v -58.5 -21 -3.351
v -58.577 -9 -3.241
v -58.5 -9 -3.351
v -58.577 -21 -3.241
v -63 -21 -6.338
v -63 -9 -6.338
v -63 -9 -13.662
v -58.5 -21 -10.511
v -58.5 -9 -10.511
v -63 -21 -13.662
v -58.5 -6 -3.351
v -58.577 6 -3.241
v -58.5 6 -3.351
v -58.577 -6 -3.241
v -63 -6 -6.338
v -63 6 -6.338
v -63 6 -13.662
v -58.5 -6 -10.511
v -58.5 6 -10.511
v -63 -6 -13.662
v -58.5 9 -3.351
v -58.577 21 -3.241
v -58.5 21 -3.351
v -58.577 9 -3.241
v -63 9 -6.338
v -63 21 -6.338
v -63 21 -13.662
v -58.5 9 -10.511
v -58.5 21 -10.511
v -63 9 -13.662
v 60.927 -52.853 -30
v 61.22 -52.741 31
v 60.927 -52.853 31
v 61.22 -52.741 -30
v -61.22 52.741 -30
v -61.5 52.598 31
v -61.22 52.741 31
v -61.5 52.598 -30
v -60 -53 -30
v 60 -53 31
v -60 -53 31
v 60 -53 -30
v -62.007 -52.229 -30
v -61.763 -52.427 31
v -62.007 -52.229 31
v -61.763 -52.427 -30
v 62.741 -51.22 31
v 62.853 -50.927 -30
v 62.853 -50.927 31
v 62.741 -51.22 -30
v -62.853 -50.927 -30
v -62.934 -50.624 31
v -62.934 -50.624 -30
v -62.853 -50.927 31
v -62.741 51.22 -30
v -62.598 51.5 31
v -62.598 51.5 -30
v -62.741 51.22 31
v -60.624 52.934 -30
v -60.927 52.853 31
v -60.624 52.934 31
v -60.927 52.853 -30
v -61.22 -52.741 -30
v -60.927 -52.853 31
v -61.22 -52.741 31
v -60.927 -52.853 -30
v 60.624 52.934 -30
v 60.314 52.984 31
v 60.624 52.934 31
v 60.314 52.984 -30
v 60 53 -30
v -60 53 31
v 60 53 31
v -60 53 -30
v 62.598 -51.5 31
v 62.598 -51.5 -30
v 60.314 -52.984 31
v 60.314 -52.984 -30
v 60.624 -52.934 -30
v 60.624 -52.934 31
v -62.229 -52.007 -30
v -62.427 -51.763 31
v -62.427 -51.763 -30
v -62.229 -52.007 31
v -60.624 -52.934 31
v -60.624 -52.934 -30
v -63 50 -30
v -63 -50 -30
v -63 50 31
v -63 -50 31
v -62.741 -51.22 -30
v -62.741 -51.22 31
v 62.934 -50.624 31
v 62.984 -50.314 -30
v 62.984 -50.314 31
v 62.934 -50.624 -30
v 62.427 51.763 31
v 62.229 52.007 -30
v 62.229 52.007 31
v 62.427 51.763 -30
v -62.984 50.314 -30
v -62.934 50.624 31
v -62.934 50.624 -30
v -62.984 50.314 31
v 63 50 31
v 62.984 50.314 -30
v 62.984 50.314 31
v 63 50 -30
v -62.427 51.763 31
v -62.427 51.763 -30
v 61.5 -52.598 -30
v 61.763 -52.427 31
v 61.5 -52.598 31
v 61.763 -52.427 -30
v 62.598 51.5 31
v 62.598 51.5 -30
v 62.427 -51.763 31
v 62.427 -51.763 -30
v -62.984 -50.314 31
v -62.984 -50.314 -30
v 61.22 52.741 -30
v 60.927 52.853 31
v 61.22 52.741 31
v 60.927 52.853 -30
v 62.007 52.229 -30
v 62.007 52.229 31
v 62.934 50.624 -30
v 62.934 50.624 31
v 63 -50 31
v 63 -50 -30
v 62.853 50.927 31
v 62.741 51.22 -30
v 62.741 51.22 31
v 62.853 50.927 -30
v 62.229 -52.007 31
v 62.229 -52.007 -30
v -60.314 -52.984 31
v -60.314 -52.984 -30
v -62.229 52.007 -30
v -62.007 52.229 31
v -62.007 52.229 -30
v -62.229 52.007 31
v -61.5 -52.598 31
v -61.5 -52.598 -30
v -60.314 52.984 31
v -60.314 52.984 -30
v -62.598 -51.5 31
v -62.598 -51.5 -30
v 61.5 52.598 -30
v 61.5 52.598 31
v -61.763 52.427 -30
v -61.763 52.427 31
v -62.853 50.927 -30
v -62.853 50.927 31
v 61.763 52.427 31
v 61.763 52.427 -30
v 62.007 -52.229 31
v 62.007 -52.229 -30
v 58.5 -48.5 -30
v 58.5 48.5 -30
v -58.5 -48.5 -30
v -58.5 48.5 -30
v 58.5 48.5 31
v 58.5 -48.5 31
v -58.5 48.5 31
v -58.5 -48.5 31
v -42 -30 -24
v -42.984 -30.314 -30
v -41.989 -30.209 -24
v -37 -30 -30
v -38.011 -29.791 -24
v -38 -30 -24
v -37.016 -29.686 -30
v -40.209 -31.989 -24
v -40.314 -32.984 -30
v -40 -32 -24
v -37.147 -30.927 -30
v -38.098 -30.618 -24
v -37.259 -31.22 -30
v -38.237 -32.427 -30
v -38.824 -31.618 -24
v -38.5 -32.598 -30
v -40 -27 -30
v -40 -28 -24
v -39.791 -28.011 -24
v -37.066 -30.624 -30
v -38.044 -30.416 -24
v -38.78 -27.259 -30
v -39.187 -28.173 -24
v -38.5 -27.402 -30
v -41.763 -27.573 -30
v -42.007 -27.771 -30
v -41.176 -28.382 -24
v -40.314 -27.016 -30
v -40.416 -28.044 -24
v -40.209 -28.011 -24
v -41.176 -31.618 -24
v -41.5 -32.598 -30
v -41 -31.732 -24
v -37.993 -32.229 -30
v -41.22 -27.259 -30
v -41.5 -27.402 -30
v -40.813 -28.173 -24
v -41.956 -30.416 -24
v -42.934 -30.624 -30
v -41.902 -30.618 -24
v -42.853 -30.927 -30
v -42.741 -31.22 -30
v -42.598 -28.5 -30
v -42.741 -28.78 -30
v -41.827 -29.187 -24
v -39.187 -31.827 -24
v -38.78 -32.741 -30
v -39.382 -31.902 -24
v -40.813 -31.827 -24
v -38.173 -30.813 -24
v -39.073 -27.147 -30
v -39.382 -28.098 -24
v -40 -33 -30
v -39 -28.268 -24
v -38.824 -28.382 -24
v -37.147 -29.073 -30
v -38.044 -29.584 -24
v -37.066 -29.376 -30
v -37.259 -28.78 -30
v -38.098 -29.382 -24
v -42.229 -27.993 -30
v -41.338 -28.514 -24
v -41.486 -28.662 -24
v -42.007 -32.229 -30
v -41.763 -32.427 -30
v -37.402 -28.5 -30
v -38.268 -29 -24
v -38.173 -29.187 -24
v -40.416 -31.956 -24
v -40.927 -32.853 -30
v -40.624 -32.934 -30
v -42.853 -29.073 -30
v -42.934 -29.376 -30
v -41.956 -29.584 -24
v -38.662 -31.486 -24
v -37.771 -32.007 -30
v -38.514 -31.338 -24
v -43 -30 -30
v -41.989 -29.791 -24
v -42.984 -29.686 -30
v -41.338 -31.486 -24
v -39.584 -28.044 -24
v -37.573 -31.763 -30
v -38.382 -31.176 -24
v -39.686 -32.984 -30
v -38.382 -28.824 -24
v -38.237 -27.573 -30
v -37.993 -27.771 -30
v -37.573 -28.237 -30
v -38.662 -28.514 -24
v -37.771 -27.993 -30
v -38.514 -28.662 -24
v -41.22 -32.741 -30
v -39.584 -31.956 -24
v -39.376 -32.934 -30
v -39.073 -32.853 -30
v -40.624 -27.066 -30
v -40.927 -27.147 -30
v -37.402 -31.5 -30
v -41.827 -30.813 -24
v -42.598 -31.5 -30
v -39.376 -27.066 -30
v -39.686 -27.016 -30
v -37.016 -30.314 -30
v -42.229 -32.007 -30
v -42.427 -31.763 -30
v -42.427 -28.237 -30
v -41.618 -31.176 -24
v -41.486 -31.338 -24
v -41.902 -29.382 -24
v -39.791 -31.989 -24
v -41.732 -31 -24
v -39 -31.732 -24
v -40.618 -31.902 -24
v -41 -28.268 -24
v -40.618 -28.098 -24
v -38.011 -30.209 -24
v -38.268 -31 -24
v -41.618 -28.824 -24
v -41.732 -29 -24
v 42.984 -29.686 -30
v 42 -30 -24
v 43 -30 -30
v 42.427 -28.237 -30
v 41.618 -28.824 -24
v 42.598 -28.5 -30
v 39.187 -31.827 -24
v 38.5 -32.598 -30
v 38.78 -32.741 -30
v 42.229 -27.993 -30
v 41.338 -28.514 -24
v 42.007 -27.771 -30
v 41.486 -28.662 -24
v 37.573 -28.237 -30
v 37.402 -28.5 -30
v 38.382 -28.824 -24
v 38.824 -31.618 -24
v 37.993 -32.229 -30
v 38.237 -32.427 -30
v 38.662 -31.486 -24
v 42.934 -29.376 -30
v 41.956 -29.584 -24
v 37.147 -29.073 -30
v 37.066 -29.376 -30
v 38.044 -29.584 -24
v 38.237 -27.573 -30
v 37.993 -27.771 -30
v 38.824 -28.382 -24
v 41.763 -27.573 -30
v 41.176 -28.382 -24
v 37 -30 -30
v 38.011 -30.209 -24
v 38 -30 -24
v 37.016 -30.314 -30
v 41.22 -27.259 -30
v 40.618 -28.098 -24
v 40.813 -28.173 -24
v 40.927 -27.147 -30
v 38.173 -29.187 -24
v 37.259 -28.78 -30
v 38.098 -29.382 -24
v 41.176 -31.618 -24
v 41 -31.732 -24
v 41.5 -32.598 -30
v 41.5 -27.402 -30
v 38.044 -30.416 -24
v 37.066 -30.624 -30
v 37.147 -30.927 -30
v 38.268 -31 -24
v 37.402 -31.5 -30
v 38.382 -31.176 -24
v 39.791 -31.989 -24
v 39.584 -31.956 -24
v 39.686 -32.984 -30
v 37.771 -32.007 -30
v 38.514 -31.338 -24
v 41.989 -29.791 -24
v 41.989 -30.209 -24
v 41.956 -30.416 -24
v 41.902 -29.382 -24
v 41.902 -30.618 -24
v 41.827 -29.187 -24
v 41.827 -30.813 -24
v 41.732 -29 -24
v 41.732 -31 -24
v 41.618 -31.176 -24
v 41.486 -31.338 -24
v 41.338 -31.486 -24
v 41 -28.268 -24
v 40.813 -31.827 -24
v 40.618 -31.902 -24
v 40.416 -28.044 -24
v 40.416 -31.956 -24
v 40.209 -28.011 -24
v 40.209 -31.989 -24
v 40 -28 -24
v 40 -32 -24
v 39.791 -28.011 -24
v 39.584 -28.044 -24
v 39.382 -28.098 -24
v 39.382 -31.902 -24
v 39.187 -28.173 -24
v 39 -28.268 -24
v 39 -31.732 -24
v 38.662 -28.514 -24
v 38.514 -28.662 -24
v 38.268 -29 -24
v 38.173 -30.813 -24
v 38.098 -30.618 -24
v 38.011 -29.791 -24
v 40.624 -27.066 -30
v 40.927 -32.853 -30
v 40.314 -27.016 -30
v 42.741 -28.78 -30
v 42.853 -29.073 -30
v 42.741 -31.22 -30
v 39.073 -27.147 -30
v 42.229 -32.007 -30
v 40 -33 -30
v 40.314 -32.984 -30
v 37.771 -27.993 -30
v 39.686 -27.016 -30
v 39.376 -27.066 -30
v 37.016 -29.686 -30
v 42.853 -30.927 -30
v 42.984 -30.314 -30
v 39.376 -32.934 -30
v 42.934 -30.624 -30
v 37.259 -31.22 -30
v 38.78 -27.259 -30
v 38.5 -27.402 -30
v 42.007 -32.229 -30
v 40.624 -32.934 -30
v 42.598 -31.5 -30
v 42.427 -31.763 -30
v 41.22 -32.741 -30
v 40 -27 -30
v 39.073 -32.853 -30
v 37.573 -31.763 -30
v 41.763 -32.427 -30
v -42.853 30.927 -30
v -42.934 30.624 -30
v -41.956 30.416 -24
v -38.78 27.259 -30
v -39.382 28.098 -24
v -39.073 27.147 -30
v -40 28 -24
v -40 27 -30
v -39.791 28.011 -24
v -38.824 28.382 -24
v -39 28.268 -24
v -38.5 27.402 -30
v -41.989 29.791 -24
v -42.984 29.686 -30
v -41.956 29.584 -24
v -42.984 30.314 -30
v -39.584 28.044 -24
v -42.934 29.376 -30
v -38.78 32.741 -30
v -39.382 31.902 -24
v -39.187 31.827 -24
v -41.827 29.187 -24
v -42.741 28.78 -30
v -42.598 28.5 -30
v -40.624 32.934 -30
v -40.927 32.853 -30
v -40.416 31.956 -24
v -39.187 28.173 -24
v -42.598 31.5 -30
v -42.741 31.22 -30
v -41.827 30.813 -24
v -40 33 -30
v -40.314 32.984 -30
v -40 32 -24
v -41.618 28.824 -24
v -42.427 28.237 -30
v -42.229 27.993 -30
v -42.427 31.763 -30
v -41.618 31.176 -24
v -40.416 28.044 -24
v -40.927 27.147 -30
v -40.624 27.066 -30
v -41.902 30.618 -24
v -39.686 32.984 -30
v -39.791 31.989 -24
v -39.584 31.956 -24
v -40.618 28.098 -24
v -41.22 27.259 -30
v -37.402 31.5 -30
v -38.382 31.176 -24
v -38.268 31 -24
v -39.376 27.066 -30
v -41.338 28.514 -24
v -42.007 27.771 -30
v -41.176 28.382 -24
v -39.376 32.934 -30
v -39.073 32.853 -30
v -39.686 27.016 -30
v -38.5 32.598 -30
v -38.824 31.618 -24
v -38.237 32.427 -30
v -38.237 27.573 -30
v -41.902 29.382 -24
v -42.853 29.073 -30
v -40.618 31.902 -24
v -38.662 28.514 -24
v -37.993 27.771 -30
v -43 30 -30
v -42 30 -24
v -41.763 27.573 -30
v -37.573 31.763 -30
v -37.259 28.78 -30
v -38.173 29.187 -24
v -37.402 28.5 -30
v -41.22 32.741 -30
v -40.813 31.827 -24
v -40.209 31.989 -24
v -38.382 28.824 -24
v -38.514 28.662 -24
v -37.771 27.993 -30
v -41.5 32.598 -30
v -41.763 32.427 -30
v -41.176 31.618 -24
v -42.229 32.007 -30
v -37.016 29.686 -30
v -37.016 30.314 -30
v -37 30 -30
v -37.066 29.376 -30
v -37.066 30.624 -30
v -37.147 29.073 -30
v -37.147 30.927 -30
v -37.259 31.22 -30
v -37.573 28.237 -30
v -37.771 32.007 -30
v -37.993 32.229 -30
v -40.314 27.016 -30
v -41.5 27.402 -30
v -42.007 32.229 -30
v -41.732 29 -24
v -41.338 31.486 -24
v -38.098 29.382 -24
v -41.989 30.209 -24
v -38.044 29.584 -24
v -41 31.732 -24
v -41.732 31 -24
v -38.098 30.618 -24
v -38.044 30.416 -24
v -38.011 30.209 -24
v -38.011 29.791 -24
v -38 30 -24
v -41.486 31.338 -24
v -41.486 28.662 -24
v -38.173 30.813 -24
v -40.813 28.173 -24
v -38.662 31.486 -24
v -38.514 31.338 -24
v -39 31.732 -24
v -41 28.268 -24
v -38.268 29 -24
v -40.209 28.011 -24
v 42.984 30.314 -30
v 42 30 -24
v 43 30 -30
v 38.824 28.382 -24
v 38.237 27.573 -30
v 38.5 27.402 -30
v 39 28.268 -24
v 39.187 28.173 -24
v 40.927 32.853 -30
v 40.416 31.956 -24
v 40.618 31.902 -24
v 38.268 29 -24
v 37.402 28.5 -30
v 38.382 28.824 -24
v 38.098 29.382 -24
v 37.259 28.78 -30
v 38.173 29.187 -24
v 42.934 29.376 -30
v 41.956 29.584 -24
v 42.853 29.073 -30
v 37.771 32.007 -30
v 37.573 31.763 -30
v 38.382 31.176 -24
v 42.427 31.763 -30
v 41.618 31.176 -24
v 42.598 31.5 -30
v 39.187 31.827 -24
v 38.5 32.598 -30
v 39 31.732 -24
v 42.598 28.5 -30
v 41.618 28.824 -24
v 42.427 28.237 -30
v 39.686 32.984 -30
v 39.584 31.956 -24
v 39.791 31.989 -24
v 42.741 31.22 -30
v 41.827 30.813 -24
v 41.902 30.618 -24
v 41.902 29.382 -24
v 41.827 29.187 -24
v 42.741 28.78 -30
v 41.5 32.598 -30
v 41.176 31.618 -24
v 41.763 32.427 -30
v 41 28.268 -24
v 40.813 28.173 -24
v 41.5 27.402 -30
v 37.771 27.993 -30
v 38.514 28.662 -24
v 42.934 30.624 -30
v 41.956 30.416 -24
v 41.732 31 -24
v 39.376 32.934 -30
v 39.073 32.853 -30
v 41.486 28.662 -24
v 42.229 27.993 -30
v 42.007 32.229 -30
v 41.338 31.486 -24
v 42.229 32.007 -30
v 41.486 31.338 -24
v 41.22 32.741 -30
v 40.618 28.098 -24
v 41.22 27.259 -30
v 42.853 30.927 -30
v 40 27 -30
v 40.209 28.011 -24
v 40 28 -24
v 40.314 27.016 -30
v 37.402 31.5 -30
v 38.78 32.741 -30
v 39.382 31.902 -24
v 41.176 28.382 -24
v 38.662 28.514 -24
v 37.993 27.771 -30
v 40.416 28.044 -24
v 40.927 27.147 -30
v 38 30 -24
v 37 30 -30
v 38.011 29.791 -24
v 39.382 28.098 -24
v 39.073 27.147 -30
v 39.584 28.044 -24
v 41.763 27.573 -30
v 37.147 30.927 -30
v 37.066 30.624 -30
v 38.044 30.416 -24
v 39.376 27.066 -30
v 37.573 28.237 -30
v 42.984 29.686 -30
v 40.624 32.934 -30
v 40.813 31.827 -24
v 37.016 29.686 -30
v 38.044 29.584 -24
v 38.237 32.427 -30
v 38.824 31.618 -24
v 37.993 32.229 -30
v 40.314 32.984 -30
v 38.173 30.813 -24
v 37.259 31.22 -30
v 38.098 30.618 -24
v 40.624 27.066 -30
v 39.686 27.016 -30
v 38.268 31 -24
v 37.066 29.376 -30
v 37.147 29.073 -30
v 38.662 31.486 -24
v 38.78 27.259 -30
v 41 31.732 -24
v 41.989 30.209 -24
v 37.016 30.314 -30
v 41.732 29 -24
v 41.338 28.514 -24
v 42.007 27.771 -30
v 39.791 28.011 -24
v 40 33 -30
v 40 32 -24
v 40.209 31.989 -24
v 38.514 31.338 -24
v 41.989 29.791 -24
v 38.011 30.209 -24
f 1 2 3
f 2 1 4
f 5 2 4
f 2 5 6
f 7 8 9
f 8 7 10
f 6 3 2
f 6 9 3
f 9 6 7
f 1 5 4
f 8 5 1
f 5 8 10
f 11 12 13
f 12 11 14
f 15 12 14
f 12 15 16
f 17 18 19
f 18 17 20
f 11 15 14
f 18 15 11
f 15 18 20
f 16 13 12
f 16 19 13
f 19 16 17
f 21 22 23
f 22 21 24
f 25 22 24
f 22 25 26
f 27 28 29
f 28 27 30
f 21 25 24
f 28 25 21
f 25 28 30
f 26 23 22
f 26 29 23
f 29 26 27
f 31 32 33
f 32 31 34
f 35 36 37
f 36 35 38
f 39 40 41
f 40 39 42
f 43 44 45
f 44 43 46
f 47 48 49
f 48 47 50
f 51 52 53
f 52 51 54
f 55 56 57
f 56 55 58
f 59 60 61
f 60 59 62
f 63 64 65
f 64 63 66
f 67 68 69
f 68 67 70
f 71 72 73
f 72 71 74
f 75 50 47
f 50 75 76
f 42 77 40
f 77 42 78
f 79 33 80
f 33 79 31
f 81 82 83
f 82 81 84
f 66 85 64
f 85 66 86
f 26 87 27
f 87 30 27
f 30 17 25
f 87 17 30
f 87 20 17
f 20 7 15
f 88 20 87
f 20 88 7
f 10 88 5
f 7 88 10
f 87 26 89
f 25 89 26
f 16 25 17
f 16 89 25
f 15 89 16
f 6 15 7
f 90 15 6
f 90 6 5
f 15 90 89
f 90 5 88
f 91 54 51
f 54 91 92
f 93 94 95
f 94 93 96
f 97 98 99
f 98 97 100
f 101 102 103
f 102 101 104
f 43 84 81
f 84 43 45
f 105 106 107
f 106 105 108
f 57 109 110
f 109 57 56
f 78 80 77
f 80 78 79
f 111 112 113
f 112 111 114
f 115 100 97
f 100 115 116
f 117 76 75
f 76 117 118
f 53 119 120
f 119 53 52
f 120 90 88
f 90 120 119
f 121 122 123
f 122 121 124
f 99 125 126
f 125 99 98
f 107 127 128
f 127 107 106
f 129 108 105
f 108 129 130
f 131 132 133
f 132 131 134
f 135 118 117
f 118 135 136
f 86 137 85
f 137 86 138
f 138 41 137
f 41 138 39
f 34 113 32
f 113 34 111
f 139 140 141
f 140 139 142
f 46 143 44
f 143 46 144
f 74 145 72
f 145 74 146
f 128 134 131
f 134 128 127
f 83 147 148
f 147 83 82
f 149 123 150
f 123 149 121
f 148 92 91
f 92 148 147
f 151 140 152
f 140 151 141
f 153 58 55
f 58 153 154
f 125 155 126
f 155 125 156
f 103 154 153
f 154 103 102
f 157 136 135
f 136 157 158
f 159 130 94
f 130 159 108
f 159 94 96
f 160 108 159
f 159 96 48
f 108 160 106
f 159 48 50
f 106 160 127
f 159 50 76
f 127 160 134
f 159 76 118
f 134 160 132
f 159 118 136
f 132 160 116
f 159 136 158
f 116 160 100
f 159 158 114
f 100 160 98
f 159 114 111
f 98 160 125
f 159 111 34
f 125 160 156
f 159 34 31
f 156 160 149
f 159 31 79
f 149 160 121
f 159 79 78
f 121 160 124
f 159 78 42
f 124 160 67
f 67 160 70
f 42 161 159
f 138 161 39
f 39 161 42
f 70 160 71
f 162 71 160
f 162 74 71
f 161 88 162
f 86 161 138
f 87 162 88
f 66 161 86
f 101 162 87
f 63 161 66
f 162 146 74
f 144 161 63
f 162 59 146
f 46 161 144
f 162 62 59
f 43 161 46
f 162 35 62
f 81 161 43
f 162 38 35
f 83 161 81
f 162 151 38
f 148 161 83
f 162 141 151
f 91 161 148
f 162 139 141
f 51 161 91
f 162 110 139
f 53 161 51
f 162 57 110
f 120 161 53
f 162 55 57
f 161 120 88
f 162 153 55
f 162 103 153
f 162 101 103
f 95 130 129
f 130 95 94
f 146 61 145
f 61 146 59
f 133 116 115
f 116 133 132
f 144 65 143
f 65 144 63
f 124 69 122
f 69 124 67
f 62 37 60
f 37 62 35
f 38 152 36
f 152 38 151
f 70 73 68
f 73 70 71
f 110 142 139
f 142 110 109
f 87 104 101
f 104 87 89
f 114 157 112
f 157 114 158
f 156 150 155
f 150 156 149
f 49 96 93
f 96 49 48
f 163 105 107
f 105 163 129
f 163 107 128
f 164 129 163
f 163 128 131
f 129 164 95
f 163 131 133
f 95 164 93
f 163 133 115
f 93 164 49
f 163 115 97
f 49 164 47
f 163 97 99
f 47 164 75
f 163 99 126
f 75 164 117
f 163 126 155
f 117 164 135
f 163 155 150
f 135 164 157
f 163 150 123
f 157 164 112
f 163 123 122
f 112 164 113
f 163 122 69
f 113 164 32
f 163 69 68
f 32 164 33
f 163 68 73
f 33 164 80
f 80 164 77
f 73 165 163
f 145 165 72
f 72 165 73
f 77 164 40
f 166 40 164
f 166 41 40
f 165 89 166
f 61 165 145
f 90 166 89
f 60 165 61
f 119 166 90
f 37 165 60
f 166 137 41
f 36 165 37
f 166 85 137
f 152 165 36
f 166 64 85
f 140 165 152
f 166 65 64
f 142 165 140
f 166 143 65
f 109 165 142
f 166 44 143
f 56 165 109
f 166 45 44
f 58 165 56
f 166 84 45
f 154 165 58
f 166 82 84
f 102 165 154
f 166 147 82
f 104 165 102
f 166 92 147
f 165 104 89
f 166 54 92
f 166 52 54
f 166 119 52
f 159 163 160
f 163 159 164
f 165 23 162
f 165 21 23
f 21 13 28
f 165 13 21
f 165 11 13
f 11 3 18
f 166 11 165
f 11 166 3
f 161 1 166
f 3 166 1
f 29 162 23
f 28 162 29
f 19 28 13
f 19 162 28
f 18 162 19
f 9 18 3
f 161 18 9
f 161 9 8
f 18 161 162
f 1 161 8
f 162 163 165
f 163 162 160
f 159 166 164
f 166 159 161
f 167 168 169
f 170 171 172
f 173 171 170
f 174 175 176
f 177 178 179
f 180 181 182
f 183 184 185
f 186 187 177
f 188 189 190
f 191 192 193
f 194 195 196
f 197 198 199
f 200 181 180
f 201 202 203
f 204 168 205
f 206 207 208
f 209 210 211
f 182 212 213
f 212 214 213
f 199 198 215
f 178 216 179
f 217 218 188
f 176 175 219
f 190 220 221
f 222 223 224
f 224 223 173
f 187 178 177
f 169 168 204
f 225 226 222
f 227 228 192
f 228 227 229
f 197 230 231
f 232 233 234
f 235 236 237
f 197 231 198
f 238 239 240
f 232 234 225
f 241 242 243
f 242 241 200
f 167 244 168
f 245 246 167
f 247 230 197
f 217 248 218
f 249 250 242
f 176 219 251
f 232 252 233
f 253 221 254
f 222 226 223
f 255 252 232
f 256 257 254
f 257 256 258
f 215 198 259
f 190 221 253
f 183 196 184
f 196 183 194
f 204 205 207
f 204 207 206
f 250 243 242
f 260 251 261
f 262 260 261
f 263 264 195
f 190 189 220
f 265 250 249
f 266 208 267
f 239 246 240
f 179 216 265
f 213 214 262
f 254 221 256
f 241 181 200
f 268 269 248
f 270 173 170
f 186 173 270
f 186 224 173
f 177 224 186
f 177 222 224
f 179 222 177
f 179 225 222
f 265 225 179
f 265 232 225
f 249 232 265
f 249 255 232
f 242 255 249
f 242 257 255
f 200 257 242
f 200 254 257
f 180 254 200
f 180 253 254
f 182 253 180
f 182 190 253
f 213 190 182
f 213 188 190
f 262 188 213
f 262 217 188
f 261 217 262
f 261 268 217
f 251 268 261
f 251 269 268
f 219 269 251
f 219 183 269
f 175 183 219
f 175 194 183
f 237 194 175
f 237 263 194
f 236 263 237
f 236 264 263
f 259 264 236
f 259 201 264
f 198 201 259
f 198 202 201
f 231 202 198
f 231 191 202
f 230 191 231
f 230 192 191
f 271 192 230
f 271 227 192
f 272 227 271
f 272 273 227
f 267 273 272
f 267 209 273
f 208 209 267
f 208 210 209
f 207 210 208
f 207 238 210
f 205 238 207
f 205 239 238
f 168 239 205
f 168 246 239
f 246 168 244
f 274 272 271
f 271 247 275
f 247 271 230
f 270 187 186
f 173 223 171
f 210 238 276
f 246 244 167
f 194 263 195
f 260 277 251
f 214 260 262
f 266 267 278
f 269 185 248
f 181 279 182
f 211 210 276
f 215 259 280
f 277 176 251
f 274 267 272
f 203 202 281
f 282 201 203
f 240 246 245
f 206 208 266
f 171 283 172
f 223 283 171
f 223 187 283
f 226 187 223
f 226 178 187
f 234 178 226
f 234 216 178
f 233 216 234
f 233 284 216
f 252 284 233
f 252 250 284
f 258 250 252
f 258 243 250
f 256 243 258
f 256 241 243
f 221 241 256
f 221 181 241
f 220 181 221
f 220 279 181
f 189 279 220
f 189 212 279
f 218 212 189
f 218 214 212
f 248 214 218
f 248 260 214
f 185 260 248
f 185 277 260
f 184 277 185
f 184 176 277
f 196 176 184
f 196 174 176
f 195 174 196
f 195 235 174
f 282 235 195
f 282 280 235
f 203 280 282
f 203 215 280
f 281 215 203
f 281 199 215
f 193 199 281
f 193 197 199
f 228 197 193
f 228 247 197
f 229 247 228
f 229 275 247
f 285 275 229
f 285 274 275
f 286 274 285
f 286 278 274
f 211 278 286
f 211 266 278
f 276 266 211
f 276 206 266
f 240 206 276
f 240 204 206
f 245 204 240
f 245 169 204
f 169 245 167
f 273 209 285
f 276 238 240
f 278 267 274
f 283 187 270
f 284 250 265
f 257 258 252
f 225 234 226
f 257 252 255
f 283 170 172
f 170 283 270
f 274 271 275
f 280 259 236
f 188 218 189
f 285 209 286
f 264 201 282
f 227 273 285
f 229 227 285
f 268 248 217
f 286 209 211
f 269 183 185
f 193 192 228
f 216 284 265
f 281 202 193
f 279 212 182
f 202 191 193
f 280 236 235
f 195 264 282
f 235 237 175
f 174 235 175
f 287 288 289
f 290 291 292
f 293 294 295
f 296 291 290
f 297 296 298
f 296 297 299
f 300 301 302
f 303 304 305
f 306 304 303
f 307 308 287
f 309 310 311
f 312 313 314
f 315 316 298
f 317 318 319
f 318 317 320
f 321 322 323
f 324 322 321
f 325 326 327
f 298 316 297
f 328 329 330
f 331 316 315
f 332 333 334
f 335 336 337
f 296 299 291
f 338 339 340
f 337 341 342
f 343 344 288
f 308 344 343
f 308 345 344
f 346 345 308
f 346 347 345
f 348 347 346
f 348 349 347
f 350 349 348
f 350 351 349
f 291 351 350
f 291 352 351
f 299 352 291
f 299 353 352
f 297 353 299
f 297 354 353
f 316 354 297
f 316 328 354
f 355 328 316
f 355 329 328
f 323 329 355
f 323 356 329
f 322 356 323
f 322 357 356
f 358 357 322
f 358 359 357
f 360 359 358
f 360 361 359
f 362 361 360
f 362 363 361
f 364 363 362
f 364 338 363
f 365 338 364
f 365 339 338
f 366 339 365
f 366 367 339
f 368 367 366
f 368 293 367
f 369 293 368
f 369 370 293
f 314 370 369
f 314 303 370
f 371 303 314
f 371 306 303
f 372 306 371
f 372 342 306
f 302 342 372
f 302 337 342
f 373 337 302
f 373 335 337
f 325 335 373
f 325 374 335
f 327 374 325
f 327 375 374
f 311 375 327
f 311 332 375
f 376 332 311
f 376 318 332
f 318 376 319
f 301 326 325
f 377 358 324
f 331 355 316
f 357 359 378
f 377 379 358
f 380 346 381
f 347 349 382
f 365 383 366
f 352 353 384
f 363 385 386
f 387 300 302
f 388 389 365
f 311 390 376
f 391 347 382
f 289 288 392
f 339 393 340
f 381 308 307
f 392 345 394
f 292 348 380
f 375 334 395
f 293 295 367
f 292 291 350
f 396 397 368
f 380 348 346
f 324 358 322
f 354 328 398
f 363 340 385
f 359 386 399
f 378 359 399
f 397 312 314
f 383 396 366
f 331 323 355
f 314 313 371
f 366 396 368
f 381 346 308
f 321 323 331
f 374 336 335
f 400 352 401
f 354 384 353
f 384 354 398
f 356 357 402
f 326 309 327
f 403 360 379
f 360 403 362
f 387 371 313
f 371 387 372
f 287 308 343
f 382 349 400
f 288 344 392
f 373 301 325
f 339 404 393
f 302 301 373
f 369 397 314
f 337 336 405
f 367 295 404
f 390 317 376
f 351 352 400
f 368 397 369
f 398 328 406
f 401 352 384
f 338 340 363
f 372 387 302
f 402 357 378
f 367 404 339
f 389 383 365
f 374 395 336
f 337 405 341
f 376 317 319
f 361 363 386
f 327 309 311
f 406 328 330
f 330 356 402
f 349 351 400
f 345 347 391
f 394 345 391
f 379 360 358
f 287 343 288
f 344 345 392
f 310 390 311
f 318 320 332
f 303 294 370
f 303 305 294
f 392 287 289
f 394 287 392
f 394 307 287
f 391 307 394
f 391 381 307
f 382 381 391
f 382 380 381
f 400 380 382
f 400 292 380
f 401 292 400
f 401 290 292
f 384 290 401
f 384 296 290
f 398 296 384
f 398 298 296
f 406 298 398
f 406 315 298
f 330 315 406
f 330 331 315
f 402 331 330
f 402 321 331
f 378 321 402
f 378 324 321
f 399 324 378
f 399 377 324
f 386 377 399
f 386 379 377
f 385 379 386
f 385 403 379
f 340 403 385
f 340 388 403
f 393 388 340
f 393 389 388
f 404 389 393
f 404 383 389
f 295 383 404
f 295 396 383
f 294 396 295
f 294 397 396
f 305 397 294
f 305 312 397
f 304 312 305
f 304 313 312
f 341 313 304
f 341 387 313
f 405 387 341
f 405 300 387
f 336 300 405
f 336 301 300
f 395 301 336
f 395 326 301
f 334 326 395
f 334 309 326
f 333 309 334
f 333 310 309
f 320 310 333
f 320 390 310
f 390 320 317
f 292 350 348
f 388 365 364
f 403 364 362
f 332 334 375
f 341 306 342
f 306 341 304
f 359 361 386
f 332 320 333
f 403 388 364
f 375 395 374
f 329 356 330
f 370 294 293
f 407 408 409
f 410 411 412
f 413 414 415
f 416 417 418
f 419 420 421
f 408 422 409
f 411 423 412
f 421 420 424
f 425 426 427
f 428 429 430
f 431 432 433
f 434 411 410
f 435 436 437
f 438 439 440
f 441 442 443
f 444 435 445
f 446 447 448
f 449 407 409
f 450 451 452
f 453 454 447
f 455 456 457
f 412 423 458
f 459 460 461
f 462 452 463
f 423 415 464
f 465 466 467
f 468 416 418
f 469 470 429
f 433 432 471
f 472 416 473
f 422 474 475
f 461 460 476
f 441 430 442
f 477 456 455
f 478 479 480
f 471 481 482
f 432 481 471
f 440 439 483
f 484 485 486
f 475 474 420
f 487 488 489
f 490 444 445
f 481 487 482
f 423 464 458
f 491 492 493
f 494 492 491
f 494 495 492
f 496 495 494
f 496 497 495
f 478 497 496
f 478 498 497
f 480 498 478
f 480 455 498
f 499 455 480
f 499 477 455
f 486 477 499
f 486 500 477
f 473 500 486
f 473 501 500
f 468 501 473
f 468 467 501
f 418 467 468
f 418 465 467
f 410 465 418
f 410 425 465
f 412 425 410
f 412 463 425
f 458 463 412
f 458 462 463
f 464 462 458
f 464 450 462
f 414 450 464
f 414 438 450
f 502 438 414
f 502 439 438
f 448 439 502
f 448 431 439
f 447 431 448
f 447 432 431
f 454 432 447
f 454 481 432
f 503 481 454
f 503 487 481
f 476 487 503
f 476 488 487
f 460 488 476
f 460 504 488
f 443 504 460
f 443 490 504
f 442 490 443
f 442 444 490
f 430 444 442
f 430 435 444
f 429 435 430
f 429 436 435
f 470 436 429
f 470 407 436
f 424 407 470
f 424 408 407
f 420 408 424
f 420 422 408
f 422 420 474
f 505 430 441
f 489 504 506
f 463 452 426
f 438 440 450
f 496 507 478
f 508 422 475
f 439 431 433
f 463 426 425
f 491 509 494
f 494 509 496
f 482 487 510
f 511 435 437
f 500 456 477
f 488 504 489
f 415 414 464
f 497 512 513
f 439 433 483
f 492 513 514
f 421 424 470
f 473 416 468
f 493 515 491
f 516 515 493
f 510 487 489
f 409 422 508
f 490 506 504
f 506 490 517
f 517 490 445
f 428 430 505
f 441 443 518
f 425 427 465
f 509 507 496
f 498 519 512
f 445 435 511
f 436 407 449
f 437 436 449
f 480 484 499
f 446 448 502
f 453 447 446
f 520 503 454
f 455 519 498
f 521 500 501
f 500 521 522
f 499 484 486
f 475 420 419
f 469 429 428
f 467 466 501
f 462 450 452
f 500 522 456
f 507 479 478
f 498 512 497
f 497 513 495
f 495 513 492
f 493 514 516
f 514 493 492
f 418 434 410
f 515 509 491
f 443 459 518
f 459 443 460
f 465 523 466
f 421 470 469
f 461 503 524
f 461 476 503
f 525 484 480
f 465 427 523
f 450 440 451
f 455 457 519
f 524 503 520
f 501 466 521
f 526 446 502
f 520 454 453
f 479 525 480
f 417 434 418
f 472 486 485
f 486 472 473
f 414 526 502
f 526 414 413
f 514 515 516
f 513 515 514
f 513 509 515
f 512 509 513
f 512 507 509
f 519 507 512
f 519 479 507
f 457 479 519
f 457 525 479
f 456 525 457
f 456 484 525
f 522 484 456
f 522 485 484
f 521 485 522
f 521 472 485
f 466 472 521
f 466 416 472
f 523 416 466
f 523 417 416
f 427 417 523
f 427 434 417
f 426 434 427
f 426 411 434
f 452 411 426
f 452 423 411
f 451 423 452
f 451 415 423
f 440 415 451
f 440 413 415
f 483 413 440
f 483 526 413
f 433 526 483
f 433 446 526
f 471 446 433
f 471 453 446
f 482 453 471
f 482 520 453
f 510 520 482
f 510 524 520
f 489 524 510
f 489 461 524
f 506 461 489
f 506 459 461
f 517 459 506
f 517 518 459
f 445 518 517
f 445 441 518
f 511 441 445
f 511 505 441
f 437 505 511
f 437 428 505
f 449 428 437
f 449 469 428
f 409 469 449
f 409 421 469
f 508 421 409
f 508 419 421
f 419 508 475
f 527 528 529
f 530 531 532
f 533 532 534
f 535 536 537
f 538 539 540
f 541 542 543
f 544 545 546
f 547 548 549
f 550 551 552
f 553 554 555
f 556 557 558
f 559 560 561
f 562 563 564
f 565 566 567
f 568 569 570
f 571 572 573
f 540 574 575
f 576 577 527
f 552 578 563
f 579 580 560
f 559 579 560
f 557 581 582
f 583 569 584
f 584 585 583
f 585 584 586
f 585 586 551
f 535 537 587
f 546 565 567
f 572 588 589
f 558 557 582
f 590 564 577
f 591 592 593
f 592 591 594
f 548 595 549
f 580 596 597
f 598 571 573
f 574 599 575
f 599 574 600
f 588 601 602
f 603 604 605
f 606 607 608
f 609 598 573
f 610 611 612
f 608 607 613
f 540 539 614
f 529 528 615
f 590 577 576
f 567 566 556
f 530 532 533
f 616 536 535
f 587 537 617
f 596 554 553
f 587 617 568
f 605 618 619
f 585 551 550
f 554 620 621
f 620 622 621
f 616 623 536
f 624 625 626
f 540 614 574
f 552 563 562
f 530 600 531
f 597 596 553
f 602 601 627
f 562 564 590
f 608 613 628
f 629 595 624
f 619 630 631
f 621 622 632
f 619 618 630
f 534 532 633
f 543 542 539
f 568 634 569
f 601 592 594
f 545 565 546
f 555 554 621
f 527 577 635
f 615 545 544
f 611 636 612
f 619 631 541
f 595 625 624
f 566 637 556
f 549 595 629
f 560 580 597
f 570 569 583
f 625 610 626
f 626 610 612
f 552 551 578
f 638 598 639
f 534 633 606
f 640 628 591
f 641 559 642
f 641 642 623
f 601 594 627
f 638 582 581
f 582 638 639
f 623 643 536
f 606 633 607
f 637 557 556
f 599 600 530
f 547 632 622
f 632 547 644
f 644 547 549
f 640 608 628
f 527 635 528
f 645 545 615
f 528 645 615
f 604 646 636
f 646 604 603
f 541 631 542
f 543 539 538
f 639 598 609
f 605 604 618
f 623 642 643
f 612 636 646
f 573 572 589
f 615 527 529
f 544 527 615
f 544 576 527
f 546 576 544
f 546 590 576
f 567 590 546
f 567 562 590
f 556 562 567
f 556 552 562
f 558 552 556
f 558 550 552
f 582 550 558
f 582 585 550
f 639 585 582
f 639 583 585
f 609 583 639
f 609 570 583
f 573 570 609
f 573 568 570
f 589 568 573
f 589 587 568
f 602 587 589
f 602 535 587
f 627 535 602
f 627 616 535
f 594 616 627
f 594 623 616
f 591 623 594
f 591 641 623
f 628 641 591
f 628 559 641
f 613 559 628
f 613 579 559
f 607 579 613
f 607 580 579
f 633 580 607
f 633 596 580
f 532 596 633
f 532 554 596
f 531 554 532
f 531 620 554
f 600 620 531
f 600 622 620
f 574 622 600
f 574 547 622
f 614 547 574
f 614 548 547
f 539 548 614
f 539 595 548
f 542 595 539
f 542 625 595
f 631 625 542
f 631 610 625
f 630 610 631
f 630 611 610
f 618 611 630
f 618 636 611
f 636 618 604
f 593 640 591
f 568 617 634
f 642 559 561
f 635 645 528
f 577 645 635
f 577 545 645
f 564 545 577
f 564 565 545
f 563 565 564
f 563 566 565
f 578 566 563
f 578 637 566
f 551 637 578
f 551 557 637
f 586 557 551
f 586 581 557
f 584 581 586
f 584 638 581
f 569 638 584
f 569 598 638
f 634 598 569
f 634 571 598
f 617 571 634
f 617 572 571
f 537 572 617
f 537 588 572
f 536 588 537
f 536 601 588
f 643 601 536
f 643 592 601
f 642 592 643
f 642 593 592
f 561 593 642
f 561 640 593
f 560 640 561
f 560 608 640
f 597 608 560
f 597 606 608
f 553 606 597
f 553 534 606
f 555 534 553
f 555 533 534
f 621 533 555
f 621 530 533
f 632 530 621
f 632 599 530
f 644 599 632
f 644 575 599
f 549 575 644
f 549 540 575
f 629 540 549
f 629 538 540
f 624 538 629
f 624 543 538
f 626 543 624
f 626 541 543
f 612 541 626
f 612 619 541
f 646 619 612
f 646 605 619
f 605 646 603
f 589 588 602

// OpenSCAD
$fn = 60;
box_width = 120;
box_length = 100;
box_height = 60;
wall_thick = 3;

union() {
    difference() {
        minkowski() {
            cube([box_width, box_length, box_height], center=true);
            cylinder(r=wall_thick, h=1);
        }
        cube([box_width - wall_thick, box_length - wall_thick, box_height + 5], center=true);
        
        // Louver dust defense channels
        for (i = [-15, 0, 15]) {
            translate([-(box_width/2 + wall_thick), i, -10])
                rotate([0, -35, 0])
                cube([15, 12, 6], center=true);
        }
    }
    // PCB Mount Posts
    translate([-40, -30, -box_height/2]) cylinder(h=6, r1=3, r2=2);
    translate([40, -30, -box_height/2])  cylinder(h=6, r1=3, r2=2);
    translate([-40, 30, -box_height/2])  cylinder(h=6, r1=3, r2=2);
    translate([40, 30, -box_height/2])   cylinder(h=6, r1=3, r2=2);
}
